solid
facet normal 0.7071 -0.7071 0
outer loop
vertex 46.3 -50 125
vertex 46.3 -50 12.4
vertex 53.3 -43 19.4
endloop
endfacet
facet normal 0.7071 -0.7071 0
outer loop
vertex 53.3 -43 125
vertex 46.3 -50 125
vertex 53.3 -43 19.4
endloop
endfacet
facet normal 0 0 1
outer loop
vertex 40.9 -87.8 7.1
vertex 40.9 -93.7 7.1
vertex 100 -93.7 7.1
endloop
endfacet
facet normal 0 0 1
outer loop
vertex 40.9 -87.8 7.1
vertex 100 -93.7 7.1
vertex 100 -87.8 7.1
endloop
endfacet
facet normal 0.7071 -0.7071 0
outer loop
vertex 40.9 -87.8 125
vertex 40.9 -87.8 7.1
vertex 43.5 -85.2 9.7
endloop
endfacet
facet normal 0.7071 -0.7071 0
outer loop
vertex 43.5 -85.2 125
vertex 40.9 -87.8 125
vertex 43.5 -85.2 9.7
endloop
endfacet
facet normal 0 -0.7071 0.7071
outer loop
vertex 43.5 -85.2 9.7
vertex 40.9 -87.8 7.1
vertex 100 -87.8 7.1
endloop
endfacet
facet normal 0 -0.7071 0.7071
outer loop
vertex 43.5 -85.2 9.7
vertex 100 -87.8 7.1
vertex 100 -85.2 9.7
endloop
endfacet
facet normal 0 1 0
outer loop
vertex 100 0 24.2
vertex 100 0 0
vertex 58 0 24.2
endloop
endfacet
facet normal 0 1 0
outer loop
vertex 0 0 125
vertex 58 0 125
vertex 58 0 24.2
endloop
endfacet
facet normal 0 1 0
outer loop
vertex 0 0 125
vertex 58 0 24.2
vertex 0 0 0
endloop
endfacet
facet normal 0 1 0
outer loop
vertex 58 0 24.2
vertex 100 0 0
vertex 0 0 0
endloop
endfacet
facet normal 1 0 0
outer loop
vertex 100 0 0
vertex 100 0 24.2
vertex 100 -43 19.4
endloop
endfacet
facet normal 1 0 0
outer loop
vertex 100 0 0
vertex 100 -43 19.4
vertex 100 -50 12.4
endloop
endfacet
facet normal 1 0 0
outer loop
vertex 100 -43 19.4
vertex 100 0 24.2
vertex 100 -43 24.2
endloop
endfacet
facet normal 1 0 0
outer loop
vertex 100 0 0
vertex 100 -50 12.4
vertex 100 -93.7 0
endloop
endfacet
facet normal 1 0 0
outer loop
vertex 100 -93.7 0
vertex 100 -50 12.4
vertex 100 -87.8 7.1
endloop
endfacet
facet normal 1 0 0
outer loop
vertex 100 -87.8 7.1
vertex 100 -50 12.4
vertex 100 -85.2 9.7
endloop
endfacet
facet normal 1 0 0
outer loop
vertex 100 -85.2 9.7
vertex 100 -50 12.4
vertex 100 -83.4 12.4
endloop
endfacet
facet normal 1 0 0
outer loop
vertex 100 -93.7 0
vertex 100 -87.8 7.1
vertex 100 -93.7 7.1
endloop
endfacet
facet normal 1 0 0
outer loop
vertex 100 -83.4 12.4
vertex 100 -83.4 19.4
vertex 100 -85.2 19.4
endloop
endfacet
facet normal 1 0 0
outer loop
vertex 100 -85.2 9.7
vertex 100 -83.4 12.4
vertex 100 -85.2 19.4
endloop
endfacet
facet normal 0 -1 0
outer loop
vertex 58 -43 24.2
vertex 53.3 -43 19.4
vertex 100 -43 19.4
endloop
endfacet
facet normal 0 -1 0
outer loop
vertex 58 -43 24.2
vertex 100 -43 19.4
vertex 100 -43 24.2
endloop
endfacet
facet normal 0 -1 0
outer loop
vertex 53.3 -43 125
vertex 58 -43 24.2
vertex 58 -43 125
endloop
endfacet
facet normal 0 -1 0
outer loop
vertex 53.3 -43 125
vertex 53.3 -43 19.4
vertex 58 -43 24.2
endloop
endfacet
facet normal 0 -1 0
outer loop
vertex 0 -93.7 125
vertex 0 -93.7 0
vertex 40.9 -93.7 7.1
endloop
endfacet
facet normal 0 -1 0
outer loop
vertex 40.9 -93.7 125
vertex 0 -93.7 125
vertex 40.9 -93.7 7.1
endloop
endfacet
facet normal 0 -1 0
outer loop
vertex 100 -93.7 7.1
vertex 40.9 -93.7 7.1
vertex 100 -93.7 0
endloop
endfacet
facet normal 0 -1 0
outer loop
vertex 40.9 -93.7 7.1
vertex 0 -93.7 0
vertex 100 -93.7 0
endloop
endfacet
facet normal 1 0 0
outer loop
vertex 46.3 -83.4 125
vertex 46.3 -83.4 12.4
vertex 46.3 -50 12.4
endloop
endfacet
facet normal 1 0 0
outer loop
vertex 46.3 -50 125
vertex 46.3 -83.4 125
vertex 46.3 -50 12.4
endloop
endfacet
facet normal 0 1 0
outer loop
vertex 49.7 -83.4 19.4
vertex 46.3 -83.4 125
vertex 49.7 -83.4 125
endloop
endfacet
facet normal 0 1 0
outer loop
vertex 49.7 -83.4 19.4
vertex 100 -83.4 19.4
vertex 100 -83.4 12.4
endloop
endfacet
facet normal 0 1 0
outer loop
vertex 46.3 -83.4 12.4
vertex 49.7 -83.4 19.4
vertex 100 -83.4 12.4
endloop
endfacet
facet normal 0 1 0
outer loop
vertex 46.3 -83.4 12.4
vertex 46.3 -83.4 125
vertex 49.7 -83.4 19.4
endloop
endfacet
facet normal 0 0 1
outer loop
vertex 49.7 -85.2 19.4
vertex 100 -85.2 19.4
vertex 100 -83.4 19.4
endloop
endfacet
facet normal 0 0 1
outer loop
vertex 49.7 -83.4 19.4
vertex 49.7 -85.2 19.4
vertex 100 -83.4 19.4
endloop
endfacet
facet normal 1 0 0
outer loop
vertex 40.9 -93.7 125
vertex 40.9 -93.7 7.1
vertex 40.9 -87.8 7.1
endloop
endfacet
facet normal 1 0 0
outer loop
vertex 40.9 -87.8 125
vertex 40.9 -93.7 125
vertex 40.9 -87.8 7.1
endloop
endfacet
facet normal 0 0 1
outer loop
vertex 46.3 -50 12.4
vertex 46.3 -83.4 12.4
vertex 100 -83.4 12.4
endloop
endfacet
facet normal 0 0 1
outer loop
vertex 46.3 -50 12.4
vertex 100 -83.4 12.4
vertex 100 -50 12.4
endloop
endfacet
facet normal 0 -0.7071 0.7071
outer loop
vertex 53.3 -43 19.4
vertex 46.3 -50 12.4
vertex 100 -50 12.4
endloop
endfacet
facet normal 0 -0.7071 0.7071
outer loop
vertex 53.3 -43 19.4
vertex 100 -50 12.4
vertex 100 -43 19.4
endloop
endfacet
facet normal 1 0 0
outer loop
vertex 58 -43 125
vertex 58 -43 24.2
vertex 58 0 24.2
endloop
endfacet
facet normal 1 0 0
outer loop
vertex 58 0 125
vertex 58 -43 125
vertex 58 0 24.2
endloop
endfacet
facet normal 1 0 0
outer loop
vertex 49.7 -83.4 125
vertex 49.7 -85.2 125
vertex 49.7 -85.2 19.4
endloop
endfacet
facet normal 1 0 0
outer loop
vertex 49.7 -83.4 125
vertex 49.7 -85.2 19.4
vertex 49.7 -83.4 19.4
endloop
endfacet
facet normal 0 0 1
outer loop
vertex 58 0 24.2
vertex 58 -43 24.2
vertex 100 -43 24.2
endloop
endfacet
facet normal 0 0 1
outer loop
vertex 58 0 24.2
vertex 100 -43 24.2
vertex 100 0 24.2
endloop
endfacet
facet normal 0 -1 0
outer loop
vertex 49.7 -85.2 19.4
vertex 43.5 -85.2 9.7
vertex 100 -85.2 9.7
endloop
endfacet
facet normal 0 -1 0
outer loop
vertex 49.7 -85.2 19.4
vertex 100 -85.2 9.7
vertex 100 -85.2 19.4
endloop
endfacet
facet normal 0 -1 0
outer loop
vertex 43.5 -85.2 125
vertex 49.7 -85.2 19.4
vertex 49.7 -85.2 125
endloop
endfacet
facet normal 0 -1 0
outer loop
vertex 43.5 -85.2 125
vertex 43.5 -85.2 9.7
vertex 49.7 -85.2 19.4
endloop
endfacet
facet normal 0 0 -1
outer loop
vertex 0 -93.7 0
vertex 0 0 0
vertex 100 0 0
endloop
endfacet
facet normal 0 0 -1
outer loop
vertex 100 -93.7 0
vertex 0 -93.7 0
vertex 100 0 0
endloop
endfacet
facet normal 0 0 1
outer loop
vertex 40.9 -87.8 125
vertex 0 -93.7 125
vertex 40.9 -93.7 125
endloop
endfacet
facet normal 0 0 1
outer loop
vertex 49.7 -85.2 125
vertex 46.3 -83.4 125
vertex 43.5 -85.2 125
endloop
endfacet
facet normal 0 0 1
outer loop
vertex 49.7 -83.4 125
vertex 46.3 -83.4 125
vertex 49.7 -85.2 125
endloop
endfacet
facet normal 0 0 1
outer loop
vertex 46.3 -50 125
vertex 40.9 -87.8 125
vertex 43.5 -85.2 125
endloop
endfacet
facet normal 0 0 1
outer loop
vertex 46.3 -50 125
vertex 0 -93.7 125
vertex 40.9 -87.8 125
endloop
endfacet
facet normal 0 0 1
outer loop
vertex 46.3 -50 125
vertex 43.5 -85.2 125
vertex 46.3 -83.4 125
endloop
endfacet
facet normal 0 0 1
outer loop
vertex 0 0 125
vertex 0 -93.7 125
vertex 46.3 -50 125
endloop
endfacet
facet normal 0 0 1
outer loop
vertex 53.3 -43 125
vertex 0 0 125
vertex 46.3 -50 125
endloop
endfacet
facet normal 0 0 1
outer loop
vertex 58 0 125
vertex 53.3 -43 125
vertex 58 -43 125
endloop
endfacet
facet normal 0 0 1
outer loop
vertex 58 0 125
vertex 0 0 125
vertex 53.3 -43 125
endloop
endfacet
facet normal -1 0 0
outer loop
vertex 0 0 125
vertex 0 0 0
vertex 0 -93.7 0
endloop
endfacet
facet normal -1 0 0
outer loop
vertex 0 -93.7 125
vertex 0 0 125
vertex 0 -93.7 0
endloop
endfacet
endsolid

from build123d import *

# Parameters (mm, degrees)
F1_DEPTH = 25
F3_DEPTH = 100
F4_DEPTH = 100


with BuildPart() as f1:
    # F0 (on Top) → F1 (new body)
    with BuildSketch(Plane.XY):
        Polygon((58, 0), (0, 0), (0, -93.7), (40.9, -93.7), (40.9, -87.8), (43.5, -85.2), (49.7, -85.2), (49.7, -83.4), (46.3, -83.4), (46.3, -50), (53.3, -43), (58, -43), align=None)
    extrude(amount=F1_DEPTH)

    # F3 (add): a face of the model
    f3_faces = [f1.faces().sort_by_distance(p)[0] for p in [
        (26.1504271655, -43.8715742384, 25),
    ]]
    extrude(f3_faces, amount=F3_DEPTH)

    # F2 (on face) → F4 (join)
    with BuildSketch(Plane(origin=(0, 0, 0), x_dir=(0, -1, 0), z_dir=(-1, 0, 0))):
        Polygon((0, 24.2), (0, 0), (93.7, 0), (93.7, 7.1), (87.8, 7.1), (85.2, 9.7), (85.2, 19.4), (83.4, 19.4), (83.4, 12.4), (50, 12.4), (43, 19.4), (43, 24.2), align=None)
    extrude(amount=-F4_DEPTH)


solid = f1.part
